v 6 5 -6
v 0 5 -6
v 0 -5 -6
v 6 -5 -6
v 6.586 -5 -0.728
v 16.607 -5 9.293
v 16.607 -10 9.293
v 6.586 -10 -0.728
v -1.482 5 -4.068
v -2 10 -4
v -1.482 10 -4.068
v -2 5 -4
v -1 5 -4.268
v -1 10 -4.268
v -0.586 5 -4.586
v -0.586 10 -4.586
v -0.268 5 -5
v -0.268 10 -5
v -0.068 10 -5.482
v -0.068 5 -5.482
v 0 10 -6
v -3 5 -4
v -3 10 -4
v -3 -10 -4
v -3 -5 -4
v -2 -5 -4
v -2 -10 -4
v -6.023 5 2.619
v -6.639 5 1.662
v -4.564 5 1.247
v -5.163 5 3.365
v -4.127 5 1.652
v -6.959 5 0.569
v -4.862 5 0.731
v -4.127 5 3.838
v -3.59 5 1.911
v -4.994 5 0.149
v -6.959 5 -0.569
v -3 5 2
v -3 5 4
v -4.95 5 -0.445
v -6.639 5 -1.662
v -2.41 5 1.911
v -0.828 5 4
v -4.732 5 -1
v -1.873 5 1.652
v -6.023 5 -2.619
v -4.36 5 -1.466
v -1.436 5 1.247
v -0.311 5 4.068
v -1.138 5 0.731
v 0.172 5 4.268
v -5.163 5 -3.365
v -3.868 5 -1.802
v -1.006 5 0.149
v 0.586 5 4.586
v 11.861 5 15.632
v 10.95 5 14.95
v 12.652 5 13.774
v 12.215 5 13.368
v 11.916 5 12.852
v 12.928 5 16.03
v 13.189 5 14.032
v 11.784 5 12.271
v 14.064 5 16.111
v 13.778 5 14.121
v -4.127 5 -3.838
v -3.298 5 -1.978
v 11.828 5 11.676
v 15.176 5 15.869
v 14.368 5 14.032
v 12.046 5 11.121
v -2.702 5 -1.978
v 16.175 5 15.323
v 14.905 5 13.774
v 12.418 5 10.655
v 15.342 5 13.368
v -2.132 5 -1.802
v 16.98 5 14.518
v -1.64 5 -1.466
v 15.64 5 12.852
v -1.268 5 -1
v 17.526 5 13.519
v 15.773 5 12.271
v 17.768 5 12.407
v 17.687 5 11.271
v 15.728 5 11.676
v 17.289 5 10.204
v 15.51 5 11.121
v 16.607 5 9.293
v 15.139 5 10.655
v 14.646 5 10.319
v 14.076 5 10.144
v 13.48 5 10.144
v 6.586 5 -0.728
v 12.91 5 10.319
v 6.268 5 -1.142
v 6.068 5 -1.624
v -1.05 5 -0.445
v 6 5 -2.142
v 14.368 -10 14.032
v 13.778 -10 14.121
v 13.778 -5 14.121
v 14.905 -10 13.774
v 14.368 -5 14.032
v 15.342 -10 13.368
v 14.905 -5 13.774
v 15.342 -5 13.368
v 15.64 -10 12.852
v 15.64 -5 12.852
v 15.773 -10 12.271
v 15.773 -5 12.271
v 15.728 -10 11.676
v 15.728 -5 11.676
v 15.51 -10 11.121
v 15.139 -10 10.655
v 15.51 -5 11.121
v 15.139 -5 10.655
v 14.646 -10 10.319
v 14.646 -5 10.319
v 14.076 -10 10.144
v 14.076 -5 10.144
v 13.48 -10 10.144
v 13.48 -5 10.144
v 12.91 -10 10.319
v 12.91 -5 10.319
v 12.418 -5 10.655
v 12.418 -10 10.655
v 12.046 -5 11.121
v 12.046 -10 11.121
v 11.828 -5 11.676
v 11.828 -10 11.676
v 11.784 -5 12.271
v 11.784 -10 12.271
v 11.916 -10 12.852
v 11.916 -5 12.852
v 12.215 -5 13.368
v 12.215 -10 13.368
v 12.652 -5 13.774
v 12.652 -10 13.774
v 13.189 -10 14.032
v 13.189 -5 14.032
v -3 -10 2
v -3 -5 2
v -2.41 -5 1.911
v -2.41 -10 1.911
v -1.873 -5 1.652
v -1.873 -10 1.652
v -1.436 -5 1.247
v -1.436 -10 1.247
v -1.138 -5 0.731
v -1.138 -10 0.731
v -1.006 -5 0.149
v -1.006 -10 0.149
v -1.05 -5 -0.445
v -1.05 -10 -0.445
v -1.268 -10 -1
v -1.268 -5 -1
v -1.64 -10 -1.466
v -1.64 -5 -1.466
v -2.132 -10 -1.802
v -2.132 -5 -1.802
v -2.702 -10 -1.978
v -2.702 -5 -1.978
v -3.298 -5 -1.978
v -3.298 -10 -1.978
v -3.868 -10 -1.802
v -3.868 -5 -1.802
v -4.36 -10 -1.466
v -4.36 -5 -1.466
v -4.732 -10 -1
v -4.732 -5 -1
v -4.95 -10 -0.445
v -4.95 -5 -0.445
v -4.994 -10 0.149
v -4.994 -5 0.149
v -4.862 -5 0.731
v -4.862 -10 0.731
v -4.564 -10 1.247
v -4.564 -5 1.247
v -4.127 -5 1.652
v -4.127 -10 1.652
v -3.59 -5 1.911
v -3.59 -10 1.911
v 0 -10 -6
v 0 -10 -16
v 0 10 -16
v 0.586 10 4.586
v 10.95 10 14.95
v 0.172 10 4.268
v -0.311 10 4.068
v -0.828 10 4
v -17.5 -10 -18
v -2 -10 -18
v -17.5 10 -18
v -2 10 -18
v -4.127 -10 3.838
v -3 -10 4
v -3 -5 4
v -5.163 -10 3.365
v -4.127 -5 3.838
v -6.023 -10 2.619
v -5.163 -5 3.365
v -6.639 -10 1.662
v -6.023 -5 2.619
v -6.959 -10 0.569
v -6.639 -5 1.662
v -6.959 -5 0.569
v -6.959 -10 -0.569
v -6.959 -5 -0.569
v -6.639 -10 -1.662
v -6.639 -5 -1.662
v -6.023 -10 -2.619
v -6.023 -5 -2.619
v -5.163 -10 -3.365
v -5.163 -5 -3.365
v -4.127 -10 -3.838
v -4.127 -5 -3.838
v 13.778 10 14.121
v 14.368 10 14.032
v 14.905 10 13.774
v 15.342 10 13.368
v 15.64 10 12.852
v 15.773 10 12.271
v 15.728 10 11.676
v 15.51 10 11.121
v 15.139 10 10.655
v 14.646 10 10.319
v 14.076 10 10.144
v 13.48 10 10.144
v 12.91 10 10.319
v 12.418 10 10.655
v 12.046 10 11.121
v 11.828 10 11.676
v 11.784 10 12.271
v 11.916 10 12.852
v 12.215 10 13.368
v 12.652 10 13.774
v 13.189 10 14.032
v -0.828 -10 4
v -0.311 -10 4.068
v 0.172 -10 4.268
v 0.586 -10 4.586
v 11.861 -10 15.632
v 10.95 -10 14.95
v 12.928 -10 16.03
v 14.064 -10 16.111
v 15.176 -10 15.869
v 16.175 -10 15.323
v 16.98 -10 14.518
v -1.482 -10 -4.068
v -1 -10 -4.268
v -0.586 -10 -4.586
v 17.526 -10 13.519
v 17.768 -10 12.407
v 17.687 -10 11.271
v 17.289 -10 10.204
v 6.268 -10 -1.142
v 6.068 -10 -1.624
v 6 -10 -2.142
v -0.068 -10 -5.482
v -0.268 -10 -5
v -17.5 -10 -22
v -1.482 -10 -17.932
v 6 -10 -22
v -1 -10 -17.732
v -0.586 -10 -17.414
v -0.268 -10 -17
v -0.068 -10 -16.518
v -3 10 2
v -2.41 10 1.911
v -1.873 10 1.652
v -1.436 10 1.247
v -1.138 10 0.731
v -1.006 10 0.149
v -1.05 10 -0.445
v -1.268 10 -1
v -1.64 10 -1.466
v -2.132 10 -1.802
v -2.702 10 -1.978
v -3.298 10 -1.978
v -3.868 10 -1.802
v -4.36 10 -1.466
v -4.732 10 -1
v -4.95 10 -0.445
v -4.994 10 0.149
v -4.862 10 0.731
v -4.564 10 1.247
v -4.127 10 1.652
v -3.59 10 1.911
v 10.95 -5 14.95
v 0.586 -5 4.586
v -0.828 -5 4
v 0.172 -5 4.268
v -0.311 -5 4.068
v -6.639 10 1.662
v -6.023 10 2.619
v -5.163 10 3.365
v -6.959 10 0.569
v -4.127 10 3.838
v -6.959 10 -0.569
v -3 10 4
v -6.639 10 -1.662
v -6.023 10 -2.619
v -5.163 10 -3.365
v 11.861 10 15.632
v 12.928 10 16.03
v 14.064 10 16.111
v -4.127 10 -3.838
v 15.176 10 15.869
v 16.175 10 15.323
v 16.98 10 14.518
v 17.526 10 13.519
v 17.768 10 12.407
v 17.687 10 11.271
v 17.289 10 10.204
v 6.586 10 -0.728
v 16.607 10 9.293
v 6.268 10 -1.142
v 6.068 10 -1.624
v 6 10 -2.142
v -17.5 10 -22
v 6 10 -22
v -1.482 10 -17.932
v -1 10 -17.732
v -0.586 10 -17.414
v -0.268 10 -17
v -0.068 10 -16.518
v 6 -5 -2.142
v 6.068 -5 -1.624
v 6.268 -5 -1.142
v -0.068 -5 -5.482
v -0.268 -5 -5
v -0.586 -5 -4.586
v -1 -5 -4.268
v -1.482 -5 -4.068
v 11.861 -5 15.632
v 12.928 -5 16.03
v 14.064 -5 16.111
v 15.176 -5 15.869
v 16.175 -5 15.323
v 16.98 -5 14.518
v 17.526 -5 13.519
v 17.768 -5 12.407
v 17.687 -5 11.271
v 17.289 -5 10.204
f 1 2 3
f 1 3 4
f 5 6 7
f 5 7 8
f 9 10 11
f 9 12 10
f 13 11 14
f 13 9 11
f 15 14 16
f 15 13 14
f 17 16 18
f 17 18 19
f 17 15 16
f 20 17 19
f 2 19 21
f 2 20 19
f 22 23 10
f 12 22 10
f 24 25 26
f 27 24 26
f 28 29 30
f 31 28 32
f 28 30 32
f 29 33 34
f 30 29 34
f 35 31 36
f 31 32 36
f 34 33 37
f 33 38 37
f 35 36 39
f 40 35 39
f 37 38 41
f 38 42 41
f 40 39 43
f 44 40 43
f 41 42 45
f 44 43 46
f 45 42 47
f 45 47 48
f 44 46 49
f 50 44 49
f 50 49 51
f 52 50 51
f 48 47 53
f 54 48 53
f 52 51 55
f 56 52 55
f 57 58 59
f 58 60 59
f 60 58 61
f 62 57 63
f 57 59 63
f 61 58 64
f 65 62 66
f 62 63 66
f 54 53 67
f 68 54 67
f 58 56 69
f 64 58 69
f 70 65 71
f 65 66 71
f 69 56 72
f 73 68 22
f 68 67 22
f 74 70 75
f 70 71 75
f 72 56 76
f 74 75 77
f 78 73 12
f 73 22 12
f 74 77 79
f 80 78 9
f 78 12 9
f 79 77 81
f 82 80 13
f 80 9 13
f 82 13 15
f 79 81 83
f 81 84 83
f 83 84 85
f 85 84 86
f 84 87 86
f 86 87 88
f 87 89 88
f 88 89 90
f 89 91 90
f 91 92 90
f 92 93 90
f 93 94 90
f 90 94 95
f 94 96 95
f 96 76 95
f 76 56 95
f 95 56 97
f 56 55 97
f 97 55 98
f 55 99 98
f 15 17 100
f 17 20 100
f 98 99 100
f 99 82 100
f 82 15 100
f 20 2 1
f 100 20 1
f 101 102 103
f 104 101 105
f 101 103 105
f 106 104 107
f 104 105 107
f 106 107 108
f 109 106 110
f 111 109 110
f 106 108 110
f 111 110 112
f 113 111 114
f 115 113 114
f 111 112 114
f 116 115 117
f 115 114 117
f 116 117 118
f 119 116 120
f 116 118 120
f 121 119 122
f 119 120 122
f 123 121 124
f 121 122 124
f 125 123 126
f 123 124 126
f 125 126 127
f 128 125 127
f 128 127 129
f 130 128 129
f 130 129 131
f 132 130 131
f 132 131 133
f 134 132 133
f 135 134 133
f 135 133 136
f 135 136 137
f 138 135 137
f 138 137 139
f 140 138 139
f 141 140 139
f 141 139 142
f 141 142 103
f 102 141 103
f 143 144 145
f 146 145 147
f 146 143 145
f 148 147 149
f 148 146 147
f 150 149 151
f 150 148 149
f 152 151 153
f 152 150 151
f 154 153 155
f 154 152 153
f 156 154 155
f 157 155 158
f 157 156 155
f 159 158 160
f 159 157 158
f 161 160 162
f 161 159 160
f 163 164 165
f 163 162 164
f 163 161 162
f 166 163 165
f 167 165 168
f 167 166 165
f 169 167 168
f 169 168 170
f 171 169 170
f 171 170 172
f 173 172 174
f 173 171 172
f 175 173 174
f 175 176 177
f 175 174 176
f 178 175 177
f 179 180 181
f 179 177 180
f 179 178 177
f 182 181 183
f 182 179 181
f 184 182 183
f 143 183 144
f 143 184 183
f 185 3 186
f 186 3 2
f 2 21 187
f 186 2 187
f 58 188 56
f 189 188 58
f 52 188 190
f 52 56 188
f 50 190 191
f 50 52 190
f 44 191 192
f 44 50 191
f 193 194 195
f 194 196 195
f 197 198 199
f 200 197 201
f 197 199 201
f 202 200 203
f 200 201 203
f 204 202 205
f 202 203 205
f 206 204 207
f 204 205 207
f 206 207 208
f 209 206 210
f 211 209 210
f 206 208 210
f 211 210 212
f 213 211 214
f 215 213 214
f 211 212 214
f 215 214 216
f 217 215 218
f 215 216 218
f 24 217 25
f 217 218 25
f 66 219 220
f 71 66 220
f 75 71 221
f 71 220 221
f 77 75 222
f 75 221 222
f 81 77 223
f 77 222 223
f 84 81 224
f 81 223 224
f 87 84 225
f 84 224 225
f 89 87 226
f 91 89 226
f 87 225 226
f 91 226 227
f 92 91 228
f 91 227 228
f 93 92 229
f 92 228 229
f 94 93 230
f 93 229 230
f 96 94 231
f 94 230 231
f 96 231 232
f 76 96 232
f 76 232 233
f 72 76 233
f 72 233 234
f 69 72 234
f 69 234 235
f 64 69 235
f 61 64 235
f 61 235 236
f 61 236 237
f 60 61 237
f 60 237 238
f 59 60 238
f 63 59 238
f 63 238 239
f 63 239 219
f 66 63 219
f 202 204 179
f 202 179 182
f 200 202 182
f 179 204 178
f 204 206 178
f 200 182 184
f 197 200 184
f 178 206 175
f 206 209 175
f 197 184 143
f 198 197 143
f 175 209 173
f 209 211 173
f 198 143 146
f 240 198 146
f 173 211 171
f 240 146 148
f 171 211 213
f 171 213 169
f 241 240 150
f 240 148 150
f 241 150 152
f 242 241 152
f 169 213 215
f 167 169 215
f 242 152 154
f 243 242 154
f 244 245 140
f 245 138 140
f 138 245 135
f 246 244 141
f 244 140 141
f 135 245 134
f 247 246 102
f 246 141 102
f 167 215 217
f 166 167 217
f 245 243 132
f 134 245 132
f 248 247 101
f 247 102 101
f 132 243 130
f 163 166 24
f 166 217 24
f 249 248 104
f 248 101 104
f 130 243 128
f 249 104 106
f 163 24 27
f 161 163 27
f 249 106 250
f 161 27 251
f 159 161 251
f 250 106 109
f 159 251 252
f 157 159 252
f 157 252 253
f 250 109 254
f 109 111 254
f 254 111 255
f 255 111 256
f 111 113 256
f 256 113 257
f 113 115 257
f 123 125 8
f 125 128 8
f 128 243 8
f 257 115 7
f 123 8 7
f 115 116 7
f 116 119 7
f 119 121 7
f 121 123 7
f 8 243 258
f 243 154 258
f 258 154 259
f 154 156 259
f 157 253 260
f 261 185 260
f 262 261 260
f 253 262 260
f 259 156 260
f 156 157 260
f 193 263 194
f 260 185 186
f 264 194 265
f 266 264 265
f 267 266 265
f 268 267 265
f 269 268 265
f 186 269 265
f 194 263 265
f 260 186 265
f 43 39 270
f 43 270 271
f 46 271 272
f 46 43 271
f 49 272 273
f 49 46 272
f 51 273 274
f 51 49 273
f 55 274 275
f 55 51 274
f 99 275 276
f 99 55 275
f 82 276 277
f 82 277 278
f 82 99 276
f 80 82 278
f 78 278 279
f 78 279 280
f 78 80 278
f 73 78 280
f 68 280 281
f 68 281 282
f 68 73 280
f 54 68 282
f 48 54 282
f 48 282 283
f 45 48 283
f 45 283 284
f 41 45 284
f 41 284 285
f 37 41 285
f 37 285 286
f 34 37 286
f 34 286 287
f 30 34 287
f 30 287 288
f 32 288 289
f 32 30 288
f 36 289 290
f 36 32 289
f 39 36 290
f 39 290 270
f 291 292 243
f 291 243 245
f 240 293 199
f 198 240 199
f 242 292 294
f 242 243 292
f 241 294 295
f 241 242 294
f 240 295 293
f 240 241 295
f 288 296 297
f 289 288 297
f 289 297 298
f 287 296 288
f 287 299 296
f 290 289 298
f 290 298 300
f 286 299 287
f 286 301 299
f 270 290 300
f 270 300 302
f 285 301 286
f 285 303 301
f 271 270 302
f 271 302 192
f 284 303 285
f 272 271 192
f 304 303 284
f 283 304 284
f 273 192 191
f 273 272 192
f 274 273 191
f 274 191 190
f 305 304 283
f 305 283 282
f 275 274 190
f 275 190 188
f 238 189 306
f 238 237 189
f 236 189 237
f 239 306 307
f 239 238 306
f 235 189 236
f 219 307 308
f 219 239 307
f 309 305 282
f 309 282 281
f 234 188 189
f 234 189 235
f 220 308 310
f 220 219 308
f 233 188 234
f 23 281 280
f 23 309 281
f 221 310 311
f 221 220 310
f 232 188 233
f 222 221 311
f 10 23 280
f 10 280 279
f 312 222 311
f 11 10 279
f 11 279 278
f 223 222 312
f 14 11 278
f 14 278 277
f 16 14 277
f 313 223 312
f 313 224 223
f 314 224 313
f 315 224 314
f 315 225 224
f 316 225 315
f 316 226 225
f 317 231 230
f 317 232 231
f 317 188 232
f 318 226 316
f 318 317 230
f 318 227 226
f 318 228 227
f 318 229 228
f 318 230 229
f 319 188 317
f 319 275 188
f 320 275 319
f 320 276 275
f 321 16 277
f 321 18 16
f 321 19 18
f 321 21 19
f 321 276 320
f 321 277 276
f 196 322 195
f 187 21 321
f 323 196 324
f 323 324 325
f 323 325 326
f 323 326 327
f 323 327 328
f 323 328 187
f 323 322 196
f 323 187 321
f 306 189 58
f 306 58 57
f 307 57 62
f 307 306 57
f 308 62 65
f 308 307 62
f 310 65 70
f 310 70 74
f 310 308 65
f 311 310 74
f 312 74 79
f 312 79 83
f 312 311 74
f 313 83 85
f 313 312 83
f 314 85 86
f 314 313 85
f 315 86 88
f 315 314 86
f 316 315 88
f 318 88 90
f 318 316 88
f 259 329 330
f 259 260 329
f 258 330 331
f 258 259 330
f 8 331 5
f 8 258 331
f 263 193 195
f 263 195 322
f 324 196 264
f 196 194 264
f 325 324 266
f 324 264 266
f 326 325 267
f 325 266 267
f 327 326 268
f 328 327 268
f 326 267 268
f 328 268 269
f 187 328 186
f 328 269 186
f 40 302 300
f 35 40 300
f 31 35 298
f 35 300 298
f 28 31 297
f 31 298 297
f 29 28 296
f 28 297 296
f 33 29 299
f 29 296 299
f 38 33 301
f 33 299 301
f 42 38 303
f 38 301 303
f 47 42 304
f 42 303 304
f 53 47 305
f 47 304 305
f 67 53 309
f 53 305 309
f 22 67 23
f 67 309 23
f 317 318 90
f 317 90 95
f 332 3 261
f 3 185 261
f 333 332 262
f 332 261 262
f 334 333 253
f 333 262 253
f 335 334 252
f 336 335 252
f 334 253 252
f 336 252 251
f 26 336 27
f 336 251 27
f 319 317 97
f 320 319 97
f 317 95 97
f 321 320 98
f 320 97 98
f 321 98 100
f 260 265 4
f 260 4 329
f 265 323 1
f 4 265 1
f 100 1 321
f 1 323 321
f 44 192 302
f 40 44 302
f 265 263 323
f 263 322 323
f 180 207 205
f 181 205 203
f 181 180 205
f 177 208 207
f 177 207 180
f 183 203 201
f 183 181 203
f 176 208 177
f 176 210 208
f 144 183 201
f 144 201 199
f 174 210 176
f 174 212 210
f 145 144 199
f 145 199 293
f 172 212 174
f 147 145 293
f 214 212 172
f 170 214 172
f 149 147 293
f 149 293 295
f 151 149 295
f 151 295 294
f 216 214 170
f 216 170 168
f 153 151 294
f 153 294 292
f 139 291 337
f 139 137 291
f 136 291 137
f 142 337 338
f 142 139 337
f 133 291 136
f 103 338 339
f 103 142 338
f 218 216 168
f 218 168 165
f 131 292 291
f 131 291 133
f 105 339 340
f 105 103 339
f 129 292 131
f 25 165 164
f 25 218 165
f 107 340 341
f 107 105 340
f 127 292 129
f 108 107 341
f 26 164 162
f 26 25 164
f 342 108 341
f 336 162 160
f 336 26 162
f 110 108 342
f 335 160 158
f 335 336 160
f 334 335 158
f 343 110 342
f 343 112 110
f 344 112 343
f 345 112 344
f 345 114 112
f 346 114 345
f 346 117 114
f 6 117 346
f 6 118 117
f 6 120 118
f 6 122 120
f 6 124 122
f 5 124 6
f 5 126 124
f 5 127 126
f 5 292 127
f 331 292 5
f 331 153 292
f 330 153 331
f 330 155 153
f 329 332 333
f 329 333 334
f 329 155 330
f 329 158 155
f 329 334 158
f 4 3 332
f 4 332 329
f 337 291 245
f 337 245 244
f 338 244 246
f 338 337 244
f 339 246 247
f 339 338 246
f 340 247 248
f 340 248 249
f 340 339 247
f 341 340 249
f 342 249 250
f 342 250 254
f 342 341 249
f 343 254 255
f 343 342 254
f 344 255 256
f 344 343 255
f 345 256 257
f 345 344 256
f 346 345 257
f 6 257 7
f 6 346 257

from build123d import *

# Parameters (mm, degrees)
BOSS_EXTRUDE1_DEPTH = 10
SKETCH3_R           = 2
BOSS_EXTRUDE2_DEPTH = 10
BOSS_EXTRUDE3_DEPTH = 20
SKETCH6_R           = 2
CUT_EXTRUDE2_DEPTH  = 20
SKETCH4_W           = 40
SKETCH4_H           = 10
CUT_EXTRUDE1_DEPTH  = 31.090136351
FILLET1_R           = 2


with BuildPart() as part:
    # Sketch1 → Boss-Extrude1 (new, symmetric)
    with BuildSketch(Plane(origin=(0, 0, 0), x_dir=(1, 0, 0), z_dir=(0, 1, 0))):
        Polygon((0, -4), (0, 18), (-17.5, 18), (-17.5, 22), (6, 22), (6, -4), align=None)
    extrude(amount=BOSS_EXTRUDE1_DEPTH, both=True)

    # Sketch3 → Boss-Extrude2 (add, symmetric)
    with BuildSketch(Plane(origin=(0, 0, 0), x_dir=(1, 0, 0), z_dir=(0, 1, 0))):
        with BuildLine():
            Line((-3, 4), (0, 4))
            Line((0, 4), (0, -4))
            Line((0, -4), (-3, -4))
            ThreePointArc((-3, -4), (-7, 0), (-3, 4))
        make_face()
        with Locations(Location((-3, 0, 0), (0, 0, 270))):
            Circle(SKETCH3_R, mode=Mode.SUBTRACT)
    extrude(amount=BOSS_EXTRUDE2_DEPTH, both=True)

    # Sketch5 → Boss-Extrude3 (add)
    with BuildSketch(Plane(origin=(0, 10, 0), x_dir=(1, 0, 0), z_dir=(0, 1, 0))):
        with BuildLine():
            Line((0, -4), (10.949747468, -14.949747468))
            ThreePointArc((10.949747468, -14.949747468), (16.606601718, -14.949747468), (16.606601718, -9.292893219))
            Line((16.606601718, -9.292893219), (6, 1.313708499))
            Line((6, 1.313708499), (0, -4))
        make_face()
    extrude(amount=-BOSS_EXTRUDE3_DEPTH)

    # Sketch6 → Cut-Extrude2 (cut)
    with BuildSketch(Plane(origin=(0, 10, 0), x_dir=(1, 0, 0), z_dir=(0, 1, 0))):
        with Locations(Location((13.778174593, -12.121320344, 0), (0, 0, 270))):
            Circle(SKETCH6_R)
    extrude(amount=-CUT_EXTRUDE2_DEPTH, mode=Mode.SUBTRACT)

    # Sketch4 → Cut-Extrude1 (cut, through all)
    with BuildSketch(Plane.XY.offset(-6)):
        with Locations((2.5, 0)):
            Rectangle(SKETCH4_W, SKETCH4_H)
    extrude(amount=CUT_EXTRUDE1_DEPTH, mode=Mode.SUBTRACT)

    # Fillet1
    fillet1_edges = [part.edges().sort_by_distance(p)[0] for p in [
        (6, 7.5, -1.313708499),
        (6, -7.5, -1.313708499),
        (0, -7.5, 4),
        (0, 7.5, 4),
        (0, 0, -18),
        (0, -7.5, -4),
        (0, 7.5, -4),
    ]]
    fillet(fillet1_edges, radius=FILLET1_R)


solid = part.part
